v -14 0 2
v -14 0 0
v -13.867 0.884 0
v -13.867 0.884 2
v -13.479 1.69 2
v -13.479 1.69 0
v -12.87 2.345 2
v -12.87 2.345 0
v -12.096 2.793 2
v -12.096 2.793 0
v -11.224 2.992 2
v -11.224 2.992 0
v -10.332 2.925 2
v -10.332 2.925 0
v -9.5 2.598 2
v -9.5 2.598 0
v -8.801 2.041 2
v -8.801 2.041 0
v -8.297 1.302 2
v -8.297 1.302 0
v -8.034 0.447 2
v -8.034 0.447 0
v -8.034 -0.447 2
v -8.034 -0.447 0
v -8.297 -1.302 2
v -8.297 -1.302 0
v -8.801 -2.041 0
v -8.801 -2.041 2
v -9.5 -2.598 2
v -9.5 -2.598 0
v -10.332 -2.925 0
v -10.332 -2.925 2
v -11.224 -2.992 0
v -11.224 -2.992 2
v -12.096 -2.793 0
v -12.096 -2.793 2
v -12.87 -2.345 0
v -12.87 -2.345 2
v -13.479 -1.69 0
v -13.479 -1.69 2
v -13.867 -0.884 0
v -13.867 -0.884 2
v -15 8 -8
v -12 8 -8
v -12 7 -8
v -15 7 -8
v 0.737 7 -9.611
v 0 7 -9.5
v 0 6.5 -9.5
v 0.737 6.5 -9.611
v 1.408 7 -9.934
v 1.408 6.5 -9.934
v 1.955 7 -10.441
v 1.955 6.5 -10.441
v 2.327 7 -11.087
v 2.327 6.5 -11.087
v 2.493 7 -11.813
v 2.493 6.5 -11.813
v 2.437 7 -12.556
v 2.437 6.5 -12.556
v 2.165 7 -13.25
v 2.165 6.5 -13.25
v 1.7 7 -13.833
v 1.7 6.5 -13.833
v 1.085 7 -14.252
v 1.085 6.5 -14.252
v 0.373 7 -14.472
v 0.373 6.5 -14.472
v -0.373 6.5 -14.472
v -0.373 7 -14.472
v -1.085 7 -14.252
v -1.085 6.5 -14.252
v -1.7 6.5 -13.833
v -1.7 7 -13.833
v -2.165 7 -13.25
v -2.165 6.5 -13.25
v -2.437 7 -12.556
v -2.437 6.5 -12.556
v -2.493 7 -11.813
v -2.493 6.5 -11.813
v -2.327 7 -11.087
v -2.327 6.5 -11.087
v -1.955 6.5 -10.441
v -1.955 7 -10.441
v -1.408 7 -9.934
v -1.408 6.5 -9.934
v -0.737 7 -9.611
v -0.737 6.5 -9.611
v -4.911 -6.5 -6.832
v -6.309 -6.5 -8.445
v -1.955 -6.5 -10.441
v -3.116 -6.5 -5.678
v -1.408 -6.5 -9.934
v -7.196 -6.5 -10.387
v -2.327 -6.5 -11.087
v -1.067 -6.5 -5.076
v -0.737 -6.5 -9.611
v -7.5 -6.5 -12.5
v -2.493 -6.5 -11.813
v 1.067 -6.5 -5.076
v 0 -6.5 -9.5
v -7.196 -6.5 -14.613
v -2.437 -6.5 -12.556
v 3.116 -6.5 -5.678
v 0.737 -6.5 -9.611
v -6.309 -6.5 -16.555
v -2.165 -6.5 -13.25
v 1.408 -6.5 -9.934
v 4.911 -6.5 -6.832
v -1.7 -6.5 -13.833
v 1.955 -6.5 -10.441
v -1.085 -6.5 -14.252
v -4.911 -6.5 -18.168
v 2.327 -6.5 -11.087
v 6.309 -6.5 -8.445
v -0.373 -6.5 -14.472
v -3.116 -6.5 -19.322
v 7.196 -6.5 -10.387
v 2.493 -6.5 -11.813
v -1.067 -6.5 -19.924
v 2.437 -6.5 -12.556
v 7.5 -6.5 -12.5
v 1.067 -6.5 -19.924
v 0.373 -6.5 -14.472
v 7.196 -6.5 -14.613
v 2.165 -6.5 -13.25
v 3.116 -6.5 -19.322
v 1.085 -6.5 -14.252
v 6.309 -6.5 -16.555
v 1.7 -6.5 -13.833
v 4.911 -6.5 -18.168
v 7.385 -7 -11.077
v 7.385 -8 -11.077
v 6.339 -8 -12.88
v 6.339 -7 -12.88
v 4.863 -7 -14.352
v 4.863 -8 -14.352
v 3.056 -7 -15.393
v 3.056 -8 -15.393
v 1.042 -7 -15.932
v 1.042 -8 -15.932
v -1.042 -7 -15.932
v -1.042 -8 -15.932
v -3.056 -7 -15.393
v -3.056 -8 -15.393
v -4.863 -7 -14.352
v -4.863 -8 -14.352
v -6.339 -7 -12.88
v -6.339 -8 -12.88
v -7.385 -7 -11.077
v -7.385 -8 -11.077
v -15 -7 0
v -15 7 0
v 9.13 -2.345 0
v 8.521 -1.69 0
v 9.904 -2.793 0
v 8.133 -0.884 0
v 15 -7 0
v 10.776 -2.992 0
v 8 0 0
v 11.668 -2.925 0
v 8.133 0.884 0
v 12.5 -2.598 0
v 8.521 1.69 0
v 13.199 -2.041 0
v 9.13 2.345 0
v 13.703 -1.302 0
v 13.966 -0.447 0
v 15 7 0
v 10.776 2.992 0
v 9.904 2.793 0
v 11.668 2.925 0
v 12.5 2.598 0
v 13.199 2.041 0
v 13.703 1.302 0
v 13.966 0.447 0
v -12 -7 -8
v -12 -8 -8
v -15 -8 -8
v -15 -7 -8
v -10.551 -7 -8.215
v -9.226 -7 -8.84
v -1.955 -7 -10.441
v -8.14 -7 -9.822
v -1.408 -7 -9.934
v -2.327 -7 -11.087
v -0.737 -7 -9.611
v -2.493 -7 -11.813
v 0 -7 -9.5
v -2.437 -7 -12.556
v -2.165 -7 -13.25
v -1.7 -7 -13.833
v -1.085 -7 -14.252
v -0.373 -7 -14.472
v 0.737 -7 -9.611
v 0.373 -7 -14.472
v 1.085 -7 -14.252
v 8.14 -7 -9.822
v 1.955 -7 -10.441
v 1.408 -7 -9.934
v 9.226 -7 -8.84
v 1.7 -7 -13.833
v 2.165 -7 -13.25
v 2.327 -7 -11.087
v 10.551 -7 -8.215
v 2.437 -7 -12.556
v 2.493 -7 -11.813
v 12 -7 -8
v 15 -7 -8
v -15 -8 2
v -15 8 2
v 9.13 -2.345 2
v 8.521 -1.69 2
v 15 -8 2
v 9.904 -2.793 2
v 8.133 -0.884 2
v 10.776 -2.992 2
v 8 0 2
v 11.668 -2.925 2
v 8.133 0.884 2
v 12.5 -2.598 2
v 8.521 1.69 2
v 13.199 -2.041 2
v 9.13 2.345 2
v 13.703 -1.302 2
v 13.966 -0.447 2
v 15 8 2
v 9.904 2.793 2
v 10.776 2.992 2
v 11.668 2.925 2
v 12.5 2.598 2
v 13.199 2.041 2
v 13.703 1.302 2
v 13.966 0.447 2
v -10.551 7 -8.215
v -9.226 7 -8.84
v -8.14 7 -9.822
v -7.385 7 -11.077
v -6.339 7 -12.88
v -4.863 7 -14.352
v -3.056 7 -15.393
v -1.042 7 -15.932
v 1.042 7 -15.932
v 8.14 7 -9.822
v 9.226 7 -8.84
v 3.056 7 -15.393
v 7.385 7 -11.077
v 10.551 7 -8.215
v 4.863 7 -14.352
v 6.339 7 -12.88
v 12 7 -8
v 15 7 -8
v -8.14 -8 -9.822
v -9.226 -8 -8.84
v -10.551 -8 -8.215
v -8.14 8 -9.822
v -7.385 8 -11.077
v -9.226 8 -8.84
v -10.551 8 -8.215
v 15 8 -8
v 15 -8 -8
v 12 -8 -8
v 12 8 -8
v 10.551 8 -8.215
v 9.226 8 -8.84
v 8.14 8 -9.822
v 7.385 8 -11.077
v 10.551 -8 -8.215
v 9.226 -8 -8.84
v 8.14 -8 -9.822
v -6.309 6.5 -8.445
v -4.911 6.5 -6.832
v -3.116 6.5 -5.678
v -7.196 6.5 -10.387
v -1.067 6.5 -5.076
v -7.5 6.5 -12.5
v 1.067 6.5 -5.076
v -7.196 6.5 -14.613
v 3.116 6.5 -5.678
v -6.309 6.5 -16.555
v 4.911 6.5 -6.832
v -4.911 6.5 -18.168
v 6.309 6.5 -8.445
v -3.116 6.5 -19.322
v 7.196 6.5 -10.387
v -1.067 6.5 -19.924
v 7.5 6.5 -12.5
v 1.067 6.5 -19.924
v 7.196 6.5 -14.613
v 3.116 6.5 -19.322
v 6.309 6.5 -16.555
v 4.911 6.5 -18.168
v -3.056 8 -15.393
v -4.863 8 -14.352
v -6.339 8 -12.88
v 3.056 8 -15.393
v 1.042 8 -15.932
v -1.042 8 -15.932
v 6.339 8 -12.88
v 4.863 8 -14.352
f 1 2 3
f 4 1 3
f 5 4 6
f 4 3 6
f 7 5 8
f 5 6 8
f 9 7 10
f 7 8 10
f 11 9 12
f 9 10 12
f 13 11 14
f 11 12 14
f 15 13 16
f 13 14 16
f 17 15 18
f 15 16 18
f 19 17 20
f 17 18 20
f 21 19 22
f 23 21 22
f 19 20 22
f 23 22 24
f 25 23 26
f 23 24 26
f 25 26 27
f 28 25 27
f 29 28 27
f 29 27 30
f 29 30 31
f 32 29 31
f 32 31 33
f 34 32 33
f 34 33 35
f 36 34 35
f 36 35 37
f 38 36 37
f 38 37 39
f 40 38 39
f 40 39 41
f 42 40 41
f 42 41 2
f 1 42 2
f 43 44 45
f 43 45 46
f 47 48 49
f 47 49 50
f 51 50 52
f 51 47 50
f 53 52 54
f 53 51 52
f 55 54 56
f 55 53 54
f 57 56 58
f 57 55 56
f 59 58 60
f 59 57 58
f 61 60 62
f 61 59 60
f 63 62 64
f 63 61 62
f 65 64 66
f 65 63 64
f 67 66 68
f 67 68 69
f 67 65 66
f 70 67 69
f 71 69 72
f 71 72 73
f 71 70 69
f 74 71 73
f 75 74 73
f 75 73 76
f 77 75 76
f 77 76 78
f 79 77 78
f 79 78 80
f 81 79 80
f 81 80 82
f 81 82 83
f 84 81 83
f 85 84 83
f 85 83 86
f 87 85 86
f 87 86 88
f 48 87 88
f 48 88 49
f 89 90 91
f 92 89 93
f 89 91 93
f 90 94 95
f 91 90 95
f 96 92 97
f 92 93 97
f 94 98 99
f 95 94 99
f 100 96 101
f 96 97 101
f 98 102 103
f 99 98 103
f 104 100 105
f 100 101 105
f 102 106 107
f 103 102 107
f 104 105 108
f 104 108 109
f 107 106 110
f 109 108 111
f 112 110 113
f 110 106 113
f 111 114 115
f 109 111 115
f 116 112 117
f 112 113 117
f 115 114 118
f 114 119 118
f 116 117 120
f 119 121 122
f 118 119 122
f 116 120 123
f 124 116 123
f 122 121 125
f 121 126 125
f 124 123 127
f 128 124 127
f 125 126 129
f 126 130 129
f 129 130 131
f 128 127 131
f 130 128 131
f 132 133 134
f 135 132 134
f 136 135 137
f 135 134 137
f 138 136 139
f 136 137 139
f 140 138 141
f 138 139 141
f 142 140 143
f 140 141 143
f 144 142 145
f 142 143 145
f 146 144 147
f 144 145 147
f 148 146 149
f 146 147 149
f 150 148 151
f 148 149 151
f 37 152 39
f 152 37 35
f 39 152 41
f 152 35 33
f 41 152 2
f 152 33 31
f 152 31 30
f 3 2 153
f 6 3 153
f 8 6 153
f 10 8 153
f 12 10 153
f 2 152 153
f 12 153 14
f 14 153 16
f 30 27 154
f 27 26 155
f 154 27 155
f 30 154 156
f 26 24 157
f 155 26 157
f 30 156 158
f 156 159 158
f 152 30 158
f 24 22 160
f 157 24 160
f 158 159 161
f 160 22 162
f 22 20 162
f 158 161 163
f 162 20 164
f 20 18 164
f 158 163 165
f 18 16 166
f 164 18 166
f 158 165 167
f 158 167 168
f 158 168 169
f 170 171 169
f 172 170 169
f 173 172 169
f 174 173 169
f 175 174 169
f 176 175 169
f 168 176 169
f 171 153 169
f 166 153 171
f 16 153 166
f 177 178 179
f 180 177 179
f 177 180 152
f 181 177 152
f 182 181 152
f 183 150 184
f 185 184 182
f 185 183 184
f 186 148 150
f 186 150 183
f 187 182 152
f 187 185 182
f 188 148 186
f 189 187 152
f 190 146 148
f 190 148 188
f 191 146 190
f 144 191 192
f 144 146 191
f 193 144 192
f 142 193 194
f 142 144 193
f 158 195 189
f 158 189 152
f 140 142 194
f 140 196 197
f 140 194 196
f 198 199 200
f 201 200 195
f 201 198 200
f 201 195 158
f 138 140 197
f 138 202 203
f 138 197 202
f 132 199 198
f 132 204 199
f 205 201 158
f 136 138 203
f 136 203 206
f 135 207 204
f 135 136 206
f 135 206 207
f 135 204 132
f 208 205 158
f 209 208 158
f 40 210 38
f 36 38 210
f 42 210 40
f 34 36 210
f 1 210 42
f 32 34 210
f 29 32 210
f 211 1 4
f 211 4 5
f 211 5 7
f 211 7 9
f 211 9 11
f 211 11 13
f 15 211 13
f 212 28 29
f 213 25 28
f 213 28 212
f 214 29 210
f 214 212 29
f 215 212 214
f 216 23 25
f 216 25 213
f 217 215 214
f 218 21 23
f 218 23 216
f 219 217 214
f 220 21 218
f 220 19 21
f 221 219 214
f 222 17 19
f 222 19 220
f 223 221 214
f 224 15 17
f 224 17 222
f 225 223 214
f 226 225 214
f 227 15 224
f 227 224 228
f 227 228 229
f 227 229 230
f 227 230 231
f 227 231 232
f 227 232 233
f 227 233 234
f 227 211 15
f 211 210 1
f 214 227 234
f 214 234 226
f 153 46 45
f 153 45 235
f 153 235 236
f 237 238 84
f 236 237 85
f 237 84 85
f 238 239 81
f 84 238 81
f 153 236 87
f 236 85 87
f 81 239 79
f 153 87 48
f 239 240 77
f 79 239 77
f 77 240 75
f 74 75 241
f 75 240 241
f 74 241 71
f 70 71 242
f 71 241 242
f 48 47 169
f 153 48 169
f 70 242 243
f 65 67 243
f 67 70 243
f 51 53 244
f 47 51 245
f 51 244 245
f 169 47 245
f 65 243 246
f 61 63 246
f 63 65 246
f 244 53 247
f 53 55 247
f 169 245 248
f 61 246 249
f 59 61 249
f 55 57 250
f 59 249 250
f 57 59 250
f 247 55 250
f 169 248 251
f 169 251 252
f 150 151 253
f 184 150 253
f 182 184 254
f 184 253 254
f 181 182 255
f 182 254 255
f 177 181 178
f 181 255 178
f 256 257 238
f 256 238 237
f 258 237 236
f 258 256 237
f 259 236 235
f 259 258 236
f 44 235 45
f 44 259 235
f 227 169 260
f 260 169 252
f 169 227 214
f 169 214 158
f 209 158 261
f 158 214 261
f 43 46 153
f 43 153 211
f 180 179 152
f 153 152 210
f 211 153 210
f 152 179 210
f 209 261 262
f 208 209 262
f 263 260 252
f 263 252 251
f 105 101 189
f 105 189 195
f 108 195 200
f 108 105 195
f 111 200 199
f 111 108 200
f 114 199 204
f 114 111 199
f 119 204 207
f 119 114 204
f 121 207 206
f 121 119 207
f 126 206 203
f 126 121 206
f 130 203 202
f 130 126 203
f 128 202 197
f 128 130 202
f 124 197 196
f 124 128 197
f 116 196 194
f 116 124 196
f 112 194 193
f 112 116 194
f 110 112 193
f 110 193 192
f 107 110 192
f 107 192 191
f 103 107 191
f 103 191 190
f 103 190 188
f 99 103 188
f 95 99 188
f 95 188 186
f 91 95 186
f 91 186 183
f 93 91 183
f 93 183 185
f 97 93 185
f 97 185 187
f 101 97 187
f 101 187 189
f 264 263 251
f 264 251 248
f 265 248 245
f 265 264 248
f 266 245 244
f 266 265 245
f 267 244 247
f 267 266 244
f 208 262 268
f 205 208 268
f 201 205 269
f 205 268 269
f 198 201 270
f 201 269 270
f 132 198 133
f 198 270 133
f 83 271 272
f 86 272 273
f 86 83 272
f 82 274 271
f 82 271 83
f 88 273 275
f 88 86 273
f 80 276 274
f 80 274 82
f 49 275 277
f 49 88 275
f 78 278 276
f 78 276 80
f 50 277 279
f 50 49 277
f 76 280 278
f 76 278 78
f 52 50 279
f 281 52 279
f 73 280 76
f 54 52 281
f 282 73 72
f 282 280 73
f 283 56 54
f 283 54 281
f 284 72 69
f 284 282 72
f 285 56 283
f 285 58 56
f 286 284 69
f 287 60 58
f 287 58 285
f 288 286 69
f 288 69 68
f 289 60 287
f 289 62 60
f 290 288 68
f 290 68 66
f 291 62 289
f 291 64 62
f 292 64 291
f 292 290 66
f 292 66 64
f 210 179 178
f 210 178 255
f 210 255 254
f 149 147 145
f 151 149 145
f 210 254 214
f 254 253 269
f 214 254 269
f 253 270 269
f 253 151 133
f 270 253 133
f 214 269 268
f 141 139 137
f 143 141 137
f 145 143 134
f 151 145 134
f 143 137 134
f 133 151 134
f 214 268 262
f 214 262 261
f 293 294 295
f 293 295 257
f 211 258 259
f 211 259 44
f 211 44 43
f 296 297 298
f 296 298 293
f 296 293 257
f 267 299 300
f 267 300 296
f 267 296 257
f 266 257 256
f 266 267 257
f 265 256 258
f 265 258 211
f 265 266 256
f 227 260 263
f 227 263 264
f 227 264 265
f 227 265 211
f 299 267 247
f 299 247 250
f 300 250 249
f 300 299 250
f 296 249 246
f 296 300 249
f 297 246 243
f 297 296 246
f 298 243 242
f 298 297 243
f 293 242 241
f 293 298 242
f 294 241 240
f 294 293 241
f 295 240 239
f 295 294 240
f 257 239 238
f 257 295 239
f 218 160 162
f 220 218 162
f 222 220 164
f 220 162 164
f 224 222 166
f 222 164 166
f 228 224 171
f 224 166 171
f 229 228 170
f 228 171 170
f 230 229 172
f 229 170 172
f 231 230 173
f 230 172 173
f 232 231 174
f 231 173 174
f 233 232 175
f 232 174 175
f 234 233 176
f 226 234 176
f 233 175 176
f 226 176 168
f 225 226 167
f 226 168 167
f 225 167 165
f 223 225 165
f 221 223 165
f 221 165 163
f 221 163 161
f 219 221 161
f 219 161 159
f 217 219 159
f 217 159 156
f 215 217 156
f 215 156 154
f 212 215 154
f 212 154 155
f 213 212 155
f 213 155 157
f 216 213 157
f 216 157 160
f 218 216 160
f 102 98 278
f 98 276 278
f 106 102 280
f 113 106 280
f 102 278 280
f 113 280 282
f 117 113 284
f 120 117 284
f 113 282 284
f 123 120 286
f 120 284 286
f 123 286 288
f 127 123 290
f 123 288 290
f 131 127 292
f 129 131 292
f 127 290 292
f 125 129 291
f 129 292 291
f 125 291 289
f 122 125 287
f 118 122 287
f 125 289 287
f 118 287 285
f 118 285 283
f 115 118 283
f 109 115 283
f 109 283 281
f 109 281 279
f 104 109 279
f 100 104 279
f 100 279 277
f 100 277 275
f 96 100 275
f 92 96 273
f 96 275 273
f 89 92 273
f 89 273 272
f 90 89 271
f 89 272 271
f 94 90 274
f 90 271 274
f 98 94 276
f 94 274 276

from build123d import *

# Parameters (mm, degrees)
SKETCH_1_W          = 30
SKETCH_1_H          = 16
EXTRUDE_1_DEPTH     = 2
EXTRUDE_2_DEPTH     = 1
SKETCH_3_R          = 2.5
EXTRUDE_3_DEPTH     = 15
SKETCH_4_W          = 7.5
SKETCH_4_H          = 13
SKETCH_5_R          = 3
CUT_EXTRUDE_1_DEPTH = 27.248809497


with BuildPart() as part:
    # 草圖1 → 填料-伸長1 (new body)
    with BuildSketch(Plane.XY):
        Rectangle(SKETCH_1_W, SKETCH_1_H)
    extrude(amount=EXTRUDE_1_DEPTH)

    # 草圖2 → 填料-伸長2 (add)
    with BuildSketch(Plane(origin=(0, 8, 0), x_dir=(1, 0, 0), z_dir=(0, 1, 0))):
        with BuildLine():
            Line((-15, 0), (15, 0))
            Line((15, 0), (15, 8))
            Line((15, 8), (12, 8))
            ThreePointArc((12, 8), (9.226499019, 8.839748528), (7.384615385, 11.076923077))
            ThreePointArc((7.384615385, 11.076923077), (0, 16), (-7.384615385, 11.076923077))
            ThreePointArc((-7.384615385, 11.076923077), (-9.226499019, 8.839748528), (-12, 8))
            Line((-12, 8), (-15, 8))
            Line((-15, 8), (-15, 0))
        make_face()
    extrude_2 = extrude(amount=-EXTRUDE_2_DEPTH)

    # 鏡射1: 填料-伸長2 across plane
    add(extrude_2.mirror(Plane.ZX))

    # 草圖3 → 填料-伸長3 (add)
    with BuildSketch(Plane(origin=(0, 8, 0), x_dir=(1, 0, 0), z_dir=(0, 1, 0))):
        with Locations(Location((0, 12, 0), (0, 0, 270))):
            Circle(SKETCH_3_R)
    extrude(amount=-EXTRUDE_3_DEPTH)

    # 草圖4 → 旋轉1 (revolve)
    with BuildSketch(Plane(origin=(0, 0, -12.5), x_dir=(-1, 0, 0), z_dir=(0, 0, -1))):
        with Locations((3.75, 0)):
            Rectangle(SKETCH_4_W, SKETCH_4_H)
    revolve(axis=Axis((0, 6.5, -12.5), (0, -1, 0)))

    # 草圖5 → 除料-伸長1 (cut, through all)
    with BuildSketch(Plane(origin=(0, 0, 0), x_dir=(-1, 0, 0), z_dir=(0, 0, -1))):
        with Locations((-11, 0)):
            Circle(SKETCH_5_R)
        with Locations((11, 0)):
            Circle(SKETCH_5_R)
    extrude(amount=-CUT_EXTRUDE_1_DEPTH, mode=Mode.SUBTRACT)


solid = part.part
